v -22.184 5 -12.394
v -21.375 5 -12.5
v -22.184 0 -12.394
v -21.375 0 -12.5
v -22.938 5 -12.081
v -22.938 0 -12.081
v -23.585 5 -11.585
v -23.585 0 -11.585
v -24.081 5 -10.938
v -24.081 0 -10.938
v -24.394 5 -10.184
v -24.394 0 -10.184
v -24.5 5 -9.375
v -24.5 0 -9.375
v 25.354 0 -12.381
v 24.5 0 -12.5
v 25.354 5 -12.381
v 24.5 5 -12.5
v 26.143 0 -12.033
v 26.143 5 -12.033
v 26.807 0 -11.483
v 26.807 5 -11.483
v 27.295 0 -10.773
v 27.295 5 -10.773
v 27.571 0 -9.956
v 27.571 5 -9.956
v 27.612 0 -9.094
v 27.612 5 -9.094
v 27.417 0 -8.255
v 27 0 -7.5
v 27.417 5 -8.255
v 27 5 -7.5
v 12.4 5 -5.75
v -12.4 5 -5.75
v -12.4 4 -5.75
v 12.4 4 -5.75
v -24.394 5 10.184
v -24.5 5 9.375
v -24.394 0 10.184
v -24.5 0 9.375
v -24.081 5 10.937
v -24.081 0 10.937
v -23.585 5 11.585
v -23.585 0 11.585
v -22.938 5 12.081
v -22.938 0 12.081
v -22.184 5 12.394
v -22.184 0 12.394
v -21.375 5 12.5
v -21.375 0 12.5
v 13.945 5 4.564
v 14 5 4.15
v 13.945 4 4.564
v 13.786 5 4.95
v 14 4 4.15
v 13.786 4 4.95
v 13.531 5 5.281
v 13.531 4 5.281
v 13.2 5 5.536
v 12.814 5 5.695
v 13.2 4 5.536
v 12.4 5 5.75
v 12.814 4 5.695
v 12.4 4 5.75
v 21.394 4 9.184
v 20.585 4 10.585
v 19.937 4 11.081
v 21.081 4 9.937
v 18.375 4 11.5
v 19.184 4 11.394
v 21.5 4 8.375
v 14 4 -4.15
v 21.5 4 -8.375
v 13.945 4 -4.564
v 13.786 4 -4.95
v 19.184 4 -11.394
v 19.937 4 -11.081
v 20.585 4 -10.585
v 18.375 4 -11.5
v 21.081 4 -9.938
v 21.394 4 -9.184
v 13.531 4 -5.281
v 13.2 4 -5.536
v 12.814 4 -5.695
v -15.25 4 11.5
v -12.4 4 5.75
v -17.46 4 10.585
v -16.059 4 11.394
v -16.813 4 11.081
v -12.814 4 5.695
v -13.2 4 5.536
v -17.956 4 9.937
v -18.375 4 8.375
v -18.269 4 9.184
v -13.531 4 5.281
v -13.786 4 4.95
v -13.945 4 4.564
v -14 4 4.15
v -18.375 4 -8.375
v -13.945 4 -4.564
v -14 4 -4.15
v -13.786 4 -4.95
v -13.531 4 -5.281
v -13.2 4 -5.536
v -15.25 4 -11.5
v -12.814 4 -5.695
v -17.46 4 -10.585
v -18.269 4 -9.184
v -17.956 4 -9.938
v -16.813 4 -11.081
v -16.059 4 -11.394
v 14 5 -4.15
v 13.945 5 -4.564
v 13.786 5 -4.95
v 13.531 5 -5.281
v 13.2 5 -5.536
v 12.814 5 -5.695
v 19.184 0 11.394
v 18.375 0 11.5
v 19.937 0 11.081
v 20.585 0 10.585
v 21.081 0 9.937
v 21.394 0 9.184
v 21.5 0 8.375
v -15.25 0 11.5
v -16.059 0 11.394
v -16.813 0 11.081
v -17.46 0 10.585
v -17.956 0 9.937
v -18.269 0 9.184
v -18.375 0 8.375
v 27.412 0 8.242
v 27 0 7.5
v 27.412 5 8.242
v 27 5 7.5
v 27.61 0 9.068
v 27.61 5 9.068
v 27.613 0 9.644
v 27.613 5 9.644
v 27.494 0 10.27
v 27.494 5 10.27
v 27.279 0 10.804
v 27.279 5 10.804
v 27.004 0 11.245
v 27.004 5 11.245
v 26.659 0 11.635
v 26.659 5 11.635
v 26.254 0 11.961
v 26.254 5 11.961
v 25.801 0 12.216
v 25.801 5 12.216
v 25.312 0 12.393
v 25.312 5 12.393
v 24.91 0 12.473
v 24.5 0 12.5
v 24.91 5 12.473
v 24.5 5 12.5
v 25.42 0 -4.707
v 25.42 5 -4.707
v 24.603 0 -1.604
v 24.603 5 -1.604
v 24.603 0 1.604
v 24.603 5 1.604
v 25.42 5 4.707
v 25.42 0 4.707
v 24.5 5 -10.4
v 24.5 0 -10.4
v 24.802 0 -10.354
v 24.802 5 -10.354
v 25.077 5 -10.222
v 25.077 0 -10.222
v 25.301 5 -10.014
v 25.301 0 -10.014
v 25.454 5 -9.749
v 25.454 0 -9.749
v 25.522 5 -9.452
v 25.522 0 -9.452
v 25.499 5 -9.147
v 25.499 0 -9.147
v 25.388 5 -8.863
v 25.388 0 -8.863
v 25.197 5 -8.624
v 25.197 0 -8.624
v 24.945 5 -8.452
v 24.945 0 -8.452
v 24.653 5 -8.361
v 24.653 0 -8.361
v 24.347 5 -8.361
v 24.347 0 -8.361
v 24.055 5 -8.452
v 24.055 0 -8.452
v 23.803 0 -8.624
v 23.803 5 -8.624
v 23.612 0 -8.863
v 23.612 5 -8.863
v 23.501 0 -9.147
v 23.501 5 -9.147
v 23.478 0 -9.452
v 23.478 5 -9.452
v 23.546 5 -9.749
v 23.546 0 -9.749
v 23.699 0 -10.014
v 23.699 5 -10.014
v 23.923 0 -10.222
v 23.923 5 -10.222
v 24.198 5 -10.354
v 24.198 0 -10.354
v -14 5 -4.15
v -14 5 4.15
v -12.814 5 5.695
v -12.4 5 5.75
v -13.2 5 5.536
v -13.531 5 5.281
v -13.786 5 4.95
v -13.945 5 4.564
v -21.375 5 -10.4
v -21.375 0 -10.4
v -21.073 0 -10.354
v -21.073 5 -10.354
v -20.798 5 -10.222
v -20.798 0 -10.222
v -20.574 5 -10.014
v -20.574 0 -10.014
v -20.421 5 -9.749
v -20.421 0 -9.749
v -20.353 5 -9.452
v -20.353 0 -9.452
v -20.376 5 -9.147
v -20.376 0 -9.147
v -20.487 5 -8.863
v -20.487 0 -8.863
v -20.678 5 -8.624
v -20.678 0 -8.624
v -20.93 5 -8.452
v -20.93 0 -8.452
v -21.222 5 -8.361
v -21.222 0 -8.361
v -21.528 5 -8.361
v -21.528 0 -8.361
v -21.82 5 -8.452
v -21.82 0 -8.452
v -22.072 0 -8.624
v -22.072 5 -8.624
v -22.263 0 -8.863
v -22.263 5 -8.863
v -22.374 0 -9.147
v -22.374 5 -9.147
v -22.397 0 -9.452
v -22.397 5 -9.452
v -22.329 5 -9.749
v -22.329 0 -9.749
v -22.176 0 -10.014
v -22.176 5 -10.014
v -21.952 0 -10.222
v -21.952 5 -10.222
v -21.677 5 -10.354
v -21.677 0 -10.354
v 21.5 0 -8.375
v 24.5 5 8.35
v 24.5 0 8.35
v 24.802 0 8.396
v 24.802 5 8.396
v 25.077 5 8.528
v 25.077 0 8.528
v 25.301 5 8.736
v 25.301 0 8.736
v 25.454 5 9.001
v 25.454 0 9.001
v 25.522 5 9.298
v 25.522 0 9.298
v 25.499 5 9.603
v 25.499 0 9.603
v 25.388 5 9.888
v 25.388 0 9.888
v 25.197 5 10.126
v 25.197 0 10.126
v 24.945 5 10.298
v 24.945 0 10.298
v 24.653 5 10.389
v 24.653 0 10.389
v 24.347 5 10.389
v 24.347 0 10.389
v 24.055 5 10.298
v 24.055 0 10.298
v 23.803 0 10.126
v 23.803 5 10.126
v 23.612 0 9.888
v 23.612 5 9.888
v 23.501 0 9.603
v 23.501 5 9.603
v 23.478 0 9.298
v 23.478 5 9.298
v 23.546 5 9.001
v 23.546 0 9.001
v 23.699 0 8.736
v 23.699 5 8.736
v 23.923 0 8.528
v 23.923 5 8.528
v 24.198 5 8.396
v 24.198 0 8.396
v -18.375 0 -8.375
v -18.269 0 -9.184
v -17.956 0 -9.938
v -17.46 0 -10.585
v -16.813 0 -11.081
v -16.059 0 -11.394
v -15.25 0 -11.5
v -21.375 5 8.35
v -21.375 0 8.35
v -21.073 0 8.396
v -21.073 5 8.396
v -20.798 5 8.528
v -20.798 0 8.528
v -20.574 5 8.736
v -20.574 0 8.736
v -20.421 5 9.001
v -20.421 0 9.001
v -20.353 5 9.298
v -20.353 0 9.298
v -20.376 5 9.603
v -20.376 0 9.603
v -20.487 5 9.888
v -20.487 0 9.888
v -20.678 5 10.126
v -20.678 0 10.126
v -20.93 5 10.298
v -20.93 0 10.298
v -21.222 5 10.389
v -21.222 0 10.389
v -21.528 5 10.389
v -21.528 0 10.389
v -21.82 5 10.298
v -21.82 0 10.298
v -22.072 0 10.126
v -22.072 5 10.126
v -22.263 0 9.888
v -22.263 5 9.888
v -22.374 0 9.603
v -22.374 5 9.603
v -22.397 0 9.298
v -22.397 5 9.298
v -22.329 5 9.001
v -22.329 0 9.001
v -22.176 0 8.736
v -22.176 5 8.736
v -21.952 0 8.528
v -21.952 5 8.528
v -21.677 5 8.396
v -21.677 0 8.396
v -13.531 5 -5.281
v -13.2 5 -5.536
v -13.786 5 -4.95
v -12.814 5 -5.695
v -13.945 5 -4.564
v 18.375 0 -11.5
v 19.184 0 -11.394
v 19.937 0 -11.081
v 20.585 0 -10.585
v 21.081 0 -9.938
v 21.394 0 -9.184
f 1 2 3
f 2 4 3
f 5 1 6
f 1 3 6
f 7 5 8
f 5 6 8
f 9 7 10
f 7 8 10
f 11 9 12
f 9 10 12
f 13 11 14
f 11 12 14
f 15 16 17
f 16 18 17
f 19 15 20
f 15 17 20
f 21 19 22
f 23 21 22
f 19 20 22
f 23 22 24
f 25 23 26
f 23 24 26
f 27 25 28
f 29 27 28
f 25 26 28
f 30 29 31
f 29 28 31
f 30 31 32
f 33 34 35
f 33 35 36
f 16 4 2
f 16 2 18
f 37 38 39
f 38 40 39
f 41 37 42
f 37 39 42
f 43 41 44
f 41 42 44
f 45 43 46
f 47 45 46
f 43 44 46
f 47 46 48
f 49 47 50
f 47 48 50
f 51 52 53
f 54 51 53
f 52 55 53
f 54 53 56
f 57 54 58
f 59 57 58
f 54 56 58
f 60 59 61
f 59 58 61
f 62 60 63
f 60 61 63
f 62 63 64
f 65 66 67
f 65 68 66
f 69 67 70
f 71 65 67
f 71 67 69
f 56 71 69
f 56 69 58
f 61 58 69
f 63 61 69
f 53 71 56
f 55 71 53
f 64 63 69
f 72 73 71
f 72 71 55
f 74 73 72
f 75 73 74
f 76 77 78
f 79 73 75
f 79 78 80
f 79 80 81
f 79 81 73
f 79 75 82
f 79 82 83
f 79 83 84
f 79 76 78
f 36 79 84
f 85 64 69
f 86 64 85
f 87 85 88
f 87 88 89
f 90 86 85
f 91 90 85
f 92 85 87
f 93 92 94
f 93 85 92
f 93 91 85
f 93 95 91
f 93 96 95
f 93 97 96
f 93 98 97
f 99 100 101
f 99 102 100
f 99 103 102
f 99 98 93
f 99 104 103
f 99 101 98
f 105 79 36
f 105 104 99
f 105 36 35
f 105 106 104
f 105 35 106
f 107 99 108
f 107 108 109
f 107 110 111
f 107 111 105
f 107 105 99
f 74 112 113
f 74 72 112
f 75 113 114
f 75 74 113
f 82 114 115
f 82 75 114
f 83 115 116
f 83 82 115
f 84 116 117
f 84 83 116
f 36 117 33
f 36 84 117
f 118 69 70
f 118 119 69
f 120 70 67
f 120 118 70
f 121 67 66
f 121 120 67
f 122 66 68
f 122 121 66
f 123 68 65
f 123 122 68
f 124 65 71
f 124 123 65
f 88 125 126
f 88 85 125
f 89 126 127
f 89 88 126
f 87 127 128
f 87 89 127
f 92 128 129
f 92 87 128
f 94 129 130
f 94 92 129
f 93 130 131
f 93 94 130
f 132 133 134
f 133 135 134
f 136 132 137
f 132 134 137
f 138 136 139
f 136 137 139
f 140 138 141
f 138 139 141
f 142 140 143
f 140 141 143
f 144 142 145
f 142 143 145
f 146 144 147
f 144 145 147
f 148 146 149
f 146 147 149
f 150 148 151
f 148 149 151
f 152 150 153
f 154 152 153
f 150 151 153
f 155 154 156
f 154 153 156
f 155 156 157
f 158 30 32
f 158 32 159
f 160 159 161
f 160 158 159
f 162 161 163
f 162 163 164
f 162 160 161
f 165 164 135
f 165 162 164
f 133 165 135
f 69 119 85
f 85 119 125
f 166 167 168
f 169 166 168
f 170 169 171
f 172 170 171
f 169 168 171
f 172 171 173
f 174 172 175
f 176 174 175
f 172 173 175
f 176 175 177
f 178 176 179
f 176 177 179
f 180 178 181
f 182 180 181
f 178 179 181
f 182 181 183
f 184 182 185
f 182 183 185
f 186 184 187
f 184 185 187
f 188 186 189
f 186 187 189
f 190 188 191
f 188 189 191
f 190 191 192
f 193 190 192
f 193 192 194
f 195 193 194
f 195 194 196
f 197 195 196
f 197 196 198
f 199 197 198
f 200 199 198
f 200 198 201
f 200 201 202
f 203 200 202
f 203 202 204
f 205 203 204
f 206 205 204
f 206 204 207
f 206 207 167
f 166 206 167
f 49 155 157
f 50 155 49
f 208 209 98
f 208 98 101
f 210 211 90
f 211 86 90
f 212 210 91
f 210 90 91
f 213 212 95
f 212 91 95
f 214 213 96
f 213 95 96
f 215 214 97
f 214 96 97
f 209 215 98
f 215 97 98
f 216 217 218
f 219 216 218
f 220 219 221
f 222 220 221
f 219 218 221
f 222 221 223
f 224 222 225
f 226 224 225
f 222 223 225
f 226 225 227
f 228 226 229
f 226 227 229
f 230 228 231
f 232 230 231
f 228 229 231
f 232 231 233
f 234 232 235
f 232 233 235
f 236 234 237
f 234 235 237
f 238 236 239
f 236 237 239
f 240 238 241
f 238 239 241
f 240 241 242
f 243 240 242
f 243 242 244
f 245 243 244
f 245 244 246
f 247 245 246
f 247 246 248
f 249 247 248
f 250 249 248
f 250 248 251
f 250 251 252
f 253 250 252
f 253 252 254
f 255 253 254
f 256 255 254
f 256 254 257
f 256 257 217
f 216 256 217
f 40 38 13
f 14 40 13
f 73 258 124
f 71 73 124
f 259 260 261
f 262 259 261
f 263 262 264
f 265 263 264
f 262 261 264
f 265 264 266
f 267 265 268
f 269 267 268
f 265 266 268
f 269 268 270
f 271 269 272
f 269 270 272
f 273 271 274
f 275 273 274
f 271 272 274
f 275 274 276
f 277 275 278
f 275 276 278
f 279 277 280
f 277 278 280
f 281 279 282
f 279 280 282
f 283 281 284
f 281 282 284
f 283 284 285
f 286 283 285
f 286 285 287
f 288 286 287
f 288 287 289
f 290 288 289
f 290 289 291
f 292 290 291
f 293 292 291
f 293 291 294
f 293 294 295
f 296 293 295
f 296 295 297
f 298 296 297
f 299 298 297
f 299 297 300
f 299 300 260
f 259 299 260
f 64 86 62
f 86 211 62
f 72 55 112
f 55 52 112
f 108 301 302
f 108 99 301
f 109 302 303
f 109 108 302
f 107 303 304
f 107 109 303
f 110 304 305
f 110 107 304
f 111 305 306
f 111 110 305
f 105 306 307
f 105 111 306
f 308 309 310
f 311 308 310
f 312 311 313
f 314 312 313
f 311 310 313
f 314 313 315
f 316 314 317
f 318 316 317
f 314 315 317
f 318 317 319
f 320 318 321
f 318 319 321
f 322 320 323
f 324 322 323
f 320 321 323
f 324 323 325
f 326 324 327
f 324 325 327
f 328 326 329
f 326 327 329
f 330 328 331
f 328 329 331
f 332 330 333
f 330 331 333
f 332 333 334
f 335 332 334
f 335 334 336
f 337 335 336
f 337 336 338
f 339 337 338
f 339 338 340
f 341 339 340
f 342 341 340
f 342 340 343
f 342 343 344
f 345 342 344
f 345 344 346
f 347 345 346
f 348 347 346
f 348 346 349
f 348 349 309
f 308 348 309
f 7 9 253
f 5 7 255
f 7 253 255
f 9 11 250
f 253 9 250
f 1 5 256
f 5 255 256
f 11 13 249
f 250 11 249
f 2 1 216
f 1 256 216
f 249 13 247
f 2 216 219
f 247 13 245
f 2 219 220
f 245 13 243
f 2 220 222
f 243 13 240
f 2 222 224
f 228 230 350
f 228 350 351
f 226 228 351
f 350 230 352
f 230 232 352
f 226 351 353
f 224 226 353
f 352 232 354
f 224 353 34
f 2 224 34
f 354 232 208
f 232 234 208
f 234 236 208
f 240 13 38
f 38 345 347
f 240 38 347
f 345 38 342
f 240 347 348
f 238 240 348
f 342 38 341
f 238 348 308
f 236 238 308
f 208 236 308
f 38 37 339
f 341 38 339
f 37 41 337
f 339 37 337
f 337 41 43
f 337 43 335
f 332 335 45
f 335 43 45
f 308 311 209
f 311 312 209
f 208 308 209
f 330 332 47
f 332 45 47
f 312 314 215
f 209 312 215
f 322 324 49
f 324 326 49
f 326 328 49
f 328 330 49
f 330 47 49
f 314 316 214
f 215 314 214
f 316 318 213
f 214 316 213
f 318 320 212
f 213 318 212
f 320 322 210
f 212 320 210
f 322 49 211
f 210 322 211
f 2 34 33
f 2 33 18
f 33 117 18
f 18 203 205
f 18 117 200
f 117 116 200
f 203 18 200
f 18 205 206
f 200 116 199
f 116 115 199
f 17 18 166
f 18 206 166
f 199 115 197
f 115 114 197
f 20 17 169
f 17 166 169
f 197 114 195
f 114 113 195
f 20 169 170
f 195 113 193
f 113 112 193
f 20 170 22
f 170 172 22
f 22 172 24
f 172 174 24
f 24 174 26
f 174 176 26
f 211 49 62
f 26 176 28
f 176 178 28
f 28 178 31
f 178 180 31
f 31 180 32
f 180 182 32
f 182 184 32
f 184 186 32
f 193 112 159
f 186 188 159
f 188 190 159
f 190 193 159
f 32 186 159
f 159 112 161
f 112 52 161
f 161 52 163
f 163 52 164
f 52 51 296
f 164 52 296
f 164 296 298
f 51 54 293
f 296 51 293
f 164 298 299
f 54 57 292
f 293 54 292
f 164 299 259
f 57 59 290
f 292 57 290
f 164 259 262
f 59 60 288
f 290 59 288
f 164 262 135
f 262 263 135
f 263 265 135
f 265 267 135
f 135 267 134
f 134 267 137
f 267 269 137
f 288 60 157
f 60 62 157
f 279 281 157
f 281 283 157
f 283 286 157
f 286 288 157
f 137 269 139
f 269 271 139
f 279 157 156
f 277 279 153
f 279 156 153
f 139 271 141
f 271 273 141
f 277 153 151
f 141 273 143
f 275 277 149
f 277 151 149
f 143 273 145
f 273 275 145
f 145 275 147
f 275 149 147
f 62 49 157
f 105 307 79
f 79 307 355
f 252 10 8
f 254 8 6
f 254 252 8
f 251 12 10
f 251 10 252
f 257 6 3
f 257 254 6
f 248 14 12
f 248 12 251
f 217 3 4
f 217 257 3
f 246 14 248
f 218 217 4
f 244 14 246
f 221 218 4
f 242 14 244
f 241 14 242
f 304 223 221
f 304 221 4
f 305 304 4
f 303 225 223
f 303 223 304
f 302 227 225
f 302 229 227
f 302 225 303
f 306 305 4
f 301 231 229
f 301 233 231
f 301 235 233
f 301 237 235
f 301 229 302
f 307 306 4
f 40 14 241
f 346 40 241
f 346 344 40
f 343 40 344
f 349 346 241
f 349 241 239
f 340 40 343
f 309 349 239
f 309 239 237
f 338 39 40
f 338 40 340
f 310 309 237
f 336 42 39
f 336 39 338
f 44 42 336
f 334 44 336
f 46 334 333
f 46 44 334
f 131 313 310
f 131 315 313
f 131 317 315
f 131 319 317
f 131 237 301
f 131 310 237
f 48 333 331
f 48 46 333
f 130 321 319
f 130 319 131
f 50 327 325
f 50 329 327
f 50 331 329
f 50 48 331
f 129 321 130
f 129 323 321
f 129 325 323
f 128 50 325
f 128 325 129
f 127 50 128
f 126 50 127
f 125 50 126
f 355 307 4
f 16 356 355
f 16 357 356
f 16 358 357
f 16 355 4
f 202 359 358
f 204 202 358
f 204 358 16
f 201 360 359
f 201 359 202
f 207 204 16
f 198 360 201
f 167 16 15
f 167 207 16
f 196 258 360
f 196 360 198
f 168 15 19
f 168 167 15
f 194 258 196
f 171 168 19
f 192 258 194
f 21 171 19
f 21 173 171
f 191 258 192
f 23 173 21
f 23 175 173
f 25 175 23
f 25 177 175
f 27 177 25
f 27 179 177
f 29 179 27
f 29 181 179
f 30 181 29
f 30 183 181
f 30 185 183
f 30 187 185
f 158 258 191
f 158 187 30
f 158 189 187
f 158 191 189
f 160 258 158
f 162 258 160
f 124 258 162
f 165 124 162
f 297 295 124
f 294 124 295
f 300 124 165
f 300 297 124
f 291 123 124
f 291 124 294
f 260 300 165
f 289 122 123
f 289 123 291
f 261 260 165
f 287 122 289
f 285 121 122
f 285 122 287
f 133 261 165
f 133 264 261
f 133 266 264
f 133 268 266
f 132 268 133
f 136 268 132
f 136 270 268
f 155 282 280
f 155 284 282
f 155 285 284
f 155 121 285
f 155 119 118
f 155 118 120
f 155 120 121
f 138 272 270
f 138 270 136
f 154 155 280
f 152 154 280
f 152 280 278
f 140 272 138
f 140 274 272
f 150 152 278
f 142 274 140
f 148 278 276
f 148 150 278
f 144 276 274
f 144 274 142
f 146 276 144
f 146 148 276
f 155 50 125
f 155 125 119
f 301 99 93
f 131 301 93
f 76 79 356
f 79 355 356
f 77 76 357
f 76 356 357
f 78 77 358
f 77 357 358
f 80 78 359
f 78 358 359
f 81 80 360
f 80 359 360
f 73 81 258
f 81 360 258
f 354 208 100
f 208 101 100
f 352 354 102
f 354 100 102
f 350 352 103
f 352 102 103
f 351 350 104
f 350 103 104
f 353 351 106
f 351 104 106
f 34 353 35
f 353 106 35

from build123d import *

# Parameters (mm, degrees)
BOSS_EXTRUDE1_DEPTH = 5
SKETCH2_W           = 28
SKETCH2_H           = 11.5
CUT_EXTRUDE1_DEPTH  = 27.220221204253797
SHELL1_T            = -1
FILLET1_R           = 1.6
FILLET2_R           = 3.125
BOSS_EXTRUDE2_DEPTH = 5
FILLET3_R           = 3.125
FILLET4_R           = 3.125
BOSS_EXTRUDE3_START = -5
BOSS_EXTRUDE3_DEPTH = 5
FILLET5_R           = 3.125
SKETCH7_R           = 1.0250000000000001
CUT_EXTRUDE2_DEPTH  = 31.730939361252858


with BuildPart() as part:
    # Sketch1 → Boss-Extrude1 (new body)
    with BuildSketch(Plane(origin=(0, 0, 0), x_dir=(1, 0, 0), z_dir=(0, 1, 0))):
        Polygon((-22.500000000000007, 12.500000000000004), (22.499999999999996, 12.500000000000004), (22.499999999999996, -12.499999999999996), (-22.500000000000004, -12.499999999999996), align=None)
    extrude(amount=BOSS_EXTRUDE1_DEPTH)

    # Sketch2 → Cut-Extrude1 (cut, through all)
    with BuildSketch(Plane(origin=(0, 5, 0), x_dir=(1, 0, 0), z_dir=(0, 1, 0))):
        Rectangle(SKETCH2_W, SKETCH2_H)
    extrude(amount=-CUT_EXTRUDE1_DEPTH, mode=Mode.SUBTRACT)

    # Shell1
    shell1_openings = [part.faces().sort_by_distance(p)[0] for p in [
        (14, 2.5, 0),
        (0, 2.5, 5.75),
        (-14, 2.5, 0),
        (0, 2.5, -5.75),
        (0, 0, -11.985218493),
    ]]
    offset(amount=SHELL1_T, openings=shell1_openings, kind=Kind.INTERSECTION)

    # Fillet1
    fillet1_edges = [part.edges().sort_by_distance(p)[0] for p in [
        (14.000000000000002, 4.5, -5.750000000000001),
        (14.000000000000002, 4.5, 5.749999999999999),
        (-13.999999999999998, 4.5, 5.749999999999999),
        (-13.999999999999998, 4.5, -5.750000000000001),
    ]]
    fillet(fillet1_edges, radius=FILLET1_R)

    # Fillet2
    fillet2_edges = [part.edges().sort_by_distance(p)[0] for p in [
        (21.499999999999996, 2, 11.499999999999996),
        (21.499999999999993, 2, -11.500000000000004),
        (-21.500000000000007, 2, -11.500000000000004),
        (-21.500000000000004, 2, 11.499999999999996),
    ]]
    fillet(fillet2_edges, radius=FILLET2_R)

    # Sketch4 → Boss-Extrude2 (add)
    with BuildSketch(Plane.XZ):
        with BuildLine():
            Line((22.499999999999996, 12.499999999999996), (22.499999999999996, -12.500000000000004))
            Line((22.499999999999996, -12.500000000000004), (37, -12.5))
            ThreePointArc((37, -12.500000000000002), (24.5, 6.814e-14), (37.000000000000135, 12.500000000000002))
            Line((37.000000000000135, 12.500000000000002), (22.499999999999996, 12.499999999999996))
        make_face()
    extrude(amount=-BOSS_EXTRUDE2_DEPTH)

    # Fillet3
    fillet3_edges = [part.edges().sort_by_distance(p)[0] for p in [
        (37, 2.5, -12.5),
    ]]
    fillet(fillet3_edges, radius=FILLET3_R)
    fillet3_2_edges = [part.edges().sort_by_distance(p)[0] for p in [
        (37.000000000000135, 2.5, 12.5),
    ]]
    fillet(fillet3_2_edges, radius=FILLET3_R)

    # Fillet4
    fillet4_edges = [part.edges().sort_by_distance(p)[0] for p in [
        (-22.500000000000004, 2.5, 12.499999999999996),
        (-22.500000000000007, 2.5, -12.500000000000004),
    ]]
    fillet(fillet4_edges, radius=FILLET4_R)

    # Sketch6 → Boss-Extrude3 (add)
    with BuildSketch(Plane.XZ.offset(BOSS_EXTRUDE3_START)):
        with BuildLine():
            ThreePointArc((-21.500000000000004, -8.375000000000004), (-20.584708691207968, -10.584708691207965), (-18.375000000000007, -11.500000000000004))
            Line((-18.375000000000004, -11.500000000000004), (-18.375000000000004, 11.499999999999996))
            ThreePointArc((-18.375000000000004, 11.499999999999996), (-20.58470869120796, 10.584708691207954), (-21.5, 8.374999999999996))
            Line((-21.5, 8.374999999999996), (-21.500000000000004, -8.375000000000004))
        make_face()
        Polygon((-24.5, -12.500000000000004), (-22.500000000000007, -12.500000000000004), (-22.500000000000007, -9.375000000000005), (-22.500000000000004, 9.374999999999996), (-22.500000000000004, 12.499999999999996), (-24.5, 12.499999999999991), align=None)
        with BuildLine():
            Line((-22.500000000000004, 9.374999999999996), (-22.500000000000007, -9.375000000000005))
            ThreePointArc((-22.500000000000007, -9.375000000000005), (-21.584708691207968, -11.584708691207966), (-19.375000000000007, -12.500000000000002))
            Line((-19.375000000000007, -12.500000000000004), (-18.375000000000004, -12.500000000000004))
            Line((-18.375000000000004, -12.500000000000004), (-18.375000000000004, -11.500000000000004))
            ThreePointArc((-18.375000000000007, -11.500000000000004), (-20.584708691207968, -10.584708691207965), (-21.500000000000004, -8.375000000000004))
            Line((-21.500000000000004, -8.375000000000004), (-21.5, 8.374999999999996))
            ThreePointArc((-21.5, 8.374999999999996), (-20.58470869120796, 10.584708691207954), (-18.375000000000004, 11.499999999999996))
            Line((-18.375000000000004, 11.499999999999996), (-18.375000000000004, 12.499999999999996))
            Line((-18.375000000000004, 12.499999999999996), (-19.375000000000004, 12.499999999999996))
            ThreePointArc((-19.375000000000004, 12.499999999999996), (-21.584708691207965, 11.584708691207958), (-22.500000000000004, 9.374999999999998))
        make_face()
        with BuildLine():
            Line((-22.500000000000007, -9.375000000000005), (-22.500000000000007, -12.500000000000004))
            Line((-22.500000000000007, -12.500000000000004), (-19.375000000000007, -12.500000000000004))
            ThreePointArc((-19.375000000000007, -12.500000000000002), (-21.584708691207968, -11.584708691207966), (-22.500000000000007, -9.375000000000005))
        make_face()
        with BuildLine():
            Line((-22.500000000000004, 12.499999999999996), (-22.500000000000004, 9.374999999999996))
            ThreePointArc((-22.500000000000004, 9.374999999999998), (-21.584708691207965, 11.584708691207958), (-19.375000000000004, 12.499999999999996))
            Line((-19.375000000000004, 12.499999999999996), (-22.500000000000004, 12.499999999999996))
        make_face()
    extrude(amount=BOSS_EXTRUDE3_DEPTH)

    # Fillet5
    fillet5_edges = [part.edges().sort_by_distance(p)[0] for p in [
        (-24.5, 2.5, 12.49999999999999),
        (-24.5, 2.5, -12.500000000000004),
        (-18.375000000000004, 2, 11.499999999999996),
        (-18.375000000000007, 2, -11.500000000000004),
    ]]
    fillet(fillet5_edges, radius=FILLET5_R)

    # Sketch7 → Cut-Extrude2 (cut, through all)
    with BuildSketch(Plane(origin=(0, 0, 0), x_dir=(-1, 0, 0), z_dir=(0, -1, 0))):
        with Locations(Location((-24.499999999999996, 9.375000000000005, 0), (0, 0, 90))):
            Circle(SKETCH7_R)
        with Locations(Location((-24.499999999999996, -9.375000000000005, 0), (0, 0, 90))):
            Circle(SKETCH7_R)
        with Locations(Location((21.375, -9.375000000000005, 0), (0, 0, 90))):
            Circle(SKETCH7_R)
        with Locations(Location((21.375, 9.375000000000005, 0), (0, 0, 90))):
            Circle(SKETCH7_R)
    extrude(amount=-CUT_EXTRUDE2_DEPTH, mode=Mode.SUBTRACT)


solid = part.part
